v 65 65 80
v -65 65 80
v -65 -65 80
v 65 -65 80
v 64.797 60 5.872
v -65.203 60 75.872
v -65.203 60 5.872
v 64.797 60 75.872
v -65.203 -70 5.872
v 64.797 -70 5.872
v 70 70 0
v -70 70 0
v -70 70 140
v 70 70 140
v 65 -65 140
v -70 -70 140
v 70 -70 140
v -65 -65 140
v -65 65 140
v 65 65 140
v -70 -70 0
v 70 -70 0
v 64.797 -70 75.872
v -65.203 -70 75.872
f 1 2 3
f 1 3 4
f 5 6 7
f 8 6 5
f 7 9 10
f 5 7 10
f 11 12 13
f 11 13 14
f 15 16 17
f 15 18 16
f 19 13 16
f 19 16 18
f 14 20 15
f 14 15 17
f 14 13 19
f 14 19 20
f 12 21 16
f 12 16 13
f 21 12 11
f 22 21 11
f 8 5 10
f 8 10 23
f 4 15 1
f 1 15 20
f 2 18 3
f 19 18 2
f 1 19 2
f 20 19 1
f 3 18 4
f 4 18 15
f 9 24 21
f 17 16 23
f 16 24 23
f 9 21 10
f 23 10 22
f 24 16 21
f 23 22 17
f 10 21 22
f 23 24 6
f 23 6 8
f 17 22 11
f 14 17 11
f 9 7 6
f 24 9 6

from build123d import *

# Parameters (mm, degrees)
F0_W     = 140
F0_H     = 140
F1_DEPTH = 140
F2_W     = 130
F2_H     = 130
F3_DEPTH = 60
F4_W     = 130
F4_H     = 70
F5_DEPTH = 130


with BuildPart() as f1:
    # F0 (on Top) → F1 (new body)
    with BuildSketch(Plane.XY):
        Rectangle(F0_W, F0_H)
    extrude(amount=F1_DEPTH)

    # F2 (on face) → F3 (cut)
    with BuildSketch(Plane.XY.offset(140)):
        Rectangle(F2_W, F2_H)
    extrude(amount=-F3_DEPTH, mode=Mode.SUBTRACT)

    # F4 (on face) → F5 (cut)
    with BuildSketch(Plane.XZ.offset(70)):
        with Locations((-0.203013, 40.872386)):
            Rectangle(F4_W, F4_H)
    extrude(amount=-F5_DEPTH, mode=Mode.SUBTRACT)


solid = f1.part
